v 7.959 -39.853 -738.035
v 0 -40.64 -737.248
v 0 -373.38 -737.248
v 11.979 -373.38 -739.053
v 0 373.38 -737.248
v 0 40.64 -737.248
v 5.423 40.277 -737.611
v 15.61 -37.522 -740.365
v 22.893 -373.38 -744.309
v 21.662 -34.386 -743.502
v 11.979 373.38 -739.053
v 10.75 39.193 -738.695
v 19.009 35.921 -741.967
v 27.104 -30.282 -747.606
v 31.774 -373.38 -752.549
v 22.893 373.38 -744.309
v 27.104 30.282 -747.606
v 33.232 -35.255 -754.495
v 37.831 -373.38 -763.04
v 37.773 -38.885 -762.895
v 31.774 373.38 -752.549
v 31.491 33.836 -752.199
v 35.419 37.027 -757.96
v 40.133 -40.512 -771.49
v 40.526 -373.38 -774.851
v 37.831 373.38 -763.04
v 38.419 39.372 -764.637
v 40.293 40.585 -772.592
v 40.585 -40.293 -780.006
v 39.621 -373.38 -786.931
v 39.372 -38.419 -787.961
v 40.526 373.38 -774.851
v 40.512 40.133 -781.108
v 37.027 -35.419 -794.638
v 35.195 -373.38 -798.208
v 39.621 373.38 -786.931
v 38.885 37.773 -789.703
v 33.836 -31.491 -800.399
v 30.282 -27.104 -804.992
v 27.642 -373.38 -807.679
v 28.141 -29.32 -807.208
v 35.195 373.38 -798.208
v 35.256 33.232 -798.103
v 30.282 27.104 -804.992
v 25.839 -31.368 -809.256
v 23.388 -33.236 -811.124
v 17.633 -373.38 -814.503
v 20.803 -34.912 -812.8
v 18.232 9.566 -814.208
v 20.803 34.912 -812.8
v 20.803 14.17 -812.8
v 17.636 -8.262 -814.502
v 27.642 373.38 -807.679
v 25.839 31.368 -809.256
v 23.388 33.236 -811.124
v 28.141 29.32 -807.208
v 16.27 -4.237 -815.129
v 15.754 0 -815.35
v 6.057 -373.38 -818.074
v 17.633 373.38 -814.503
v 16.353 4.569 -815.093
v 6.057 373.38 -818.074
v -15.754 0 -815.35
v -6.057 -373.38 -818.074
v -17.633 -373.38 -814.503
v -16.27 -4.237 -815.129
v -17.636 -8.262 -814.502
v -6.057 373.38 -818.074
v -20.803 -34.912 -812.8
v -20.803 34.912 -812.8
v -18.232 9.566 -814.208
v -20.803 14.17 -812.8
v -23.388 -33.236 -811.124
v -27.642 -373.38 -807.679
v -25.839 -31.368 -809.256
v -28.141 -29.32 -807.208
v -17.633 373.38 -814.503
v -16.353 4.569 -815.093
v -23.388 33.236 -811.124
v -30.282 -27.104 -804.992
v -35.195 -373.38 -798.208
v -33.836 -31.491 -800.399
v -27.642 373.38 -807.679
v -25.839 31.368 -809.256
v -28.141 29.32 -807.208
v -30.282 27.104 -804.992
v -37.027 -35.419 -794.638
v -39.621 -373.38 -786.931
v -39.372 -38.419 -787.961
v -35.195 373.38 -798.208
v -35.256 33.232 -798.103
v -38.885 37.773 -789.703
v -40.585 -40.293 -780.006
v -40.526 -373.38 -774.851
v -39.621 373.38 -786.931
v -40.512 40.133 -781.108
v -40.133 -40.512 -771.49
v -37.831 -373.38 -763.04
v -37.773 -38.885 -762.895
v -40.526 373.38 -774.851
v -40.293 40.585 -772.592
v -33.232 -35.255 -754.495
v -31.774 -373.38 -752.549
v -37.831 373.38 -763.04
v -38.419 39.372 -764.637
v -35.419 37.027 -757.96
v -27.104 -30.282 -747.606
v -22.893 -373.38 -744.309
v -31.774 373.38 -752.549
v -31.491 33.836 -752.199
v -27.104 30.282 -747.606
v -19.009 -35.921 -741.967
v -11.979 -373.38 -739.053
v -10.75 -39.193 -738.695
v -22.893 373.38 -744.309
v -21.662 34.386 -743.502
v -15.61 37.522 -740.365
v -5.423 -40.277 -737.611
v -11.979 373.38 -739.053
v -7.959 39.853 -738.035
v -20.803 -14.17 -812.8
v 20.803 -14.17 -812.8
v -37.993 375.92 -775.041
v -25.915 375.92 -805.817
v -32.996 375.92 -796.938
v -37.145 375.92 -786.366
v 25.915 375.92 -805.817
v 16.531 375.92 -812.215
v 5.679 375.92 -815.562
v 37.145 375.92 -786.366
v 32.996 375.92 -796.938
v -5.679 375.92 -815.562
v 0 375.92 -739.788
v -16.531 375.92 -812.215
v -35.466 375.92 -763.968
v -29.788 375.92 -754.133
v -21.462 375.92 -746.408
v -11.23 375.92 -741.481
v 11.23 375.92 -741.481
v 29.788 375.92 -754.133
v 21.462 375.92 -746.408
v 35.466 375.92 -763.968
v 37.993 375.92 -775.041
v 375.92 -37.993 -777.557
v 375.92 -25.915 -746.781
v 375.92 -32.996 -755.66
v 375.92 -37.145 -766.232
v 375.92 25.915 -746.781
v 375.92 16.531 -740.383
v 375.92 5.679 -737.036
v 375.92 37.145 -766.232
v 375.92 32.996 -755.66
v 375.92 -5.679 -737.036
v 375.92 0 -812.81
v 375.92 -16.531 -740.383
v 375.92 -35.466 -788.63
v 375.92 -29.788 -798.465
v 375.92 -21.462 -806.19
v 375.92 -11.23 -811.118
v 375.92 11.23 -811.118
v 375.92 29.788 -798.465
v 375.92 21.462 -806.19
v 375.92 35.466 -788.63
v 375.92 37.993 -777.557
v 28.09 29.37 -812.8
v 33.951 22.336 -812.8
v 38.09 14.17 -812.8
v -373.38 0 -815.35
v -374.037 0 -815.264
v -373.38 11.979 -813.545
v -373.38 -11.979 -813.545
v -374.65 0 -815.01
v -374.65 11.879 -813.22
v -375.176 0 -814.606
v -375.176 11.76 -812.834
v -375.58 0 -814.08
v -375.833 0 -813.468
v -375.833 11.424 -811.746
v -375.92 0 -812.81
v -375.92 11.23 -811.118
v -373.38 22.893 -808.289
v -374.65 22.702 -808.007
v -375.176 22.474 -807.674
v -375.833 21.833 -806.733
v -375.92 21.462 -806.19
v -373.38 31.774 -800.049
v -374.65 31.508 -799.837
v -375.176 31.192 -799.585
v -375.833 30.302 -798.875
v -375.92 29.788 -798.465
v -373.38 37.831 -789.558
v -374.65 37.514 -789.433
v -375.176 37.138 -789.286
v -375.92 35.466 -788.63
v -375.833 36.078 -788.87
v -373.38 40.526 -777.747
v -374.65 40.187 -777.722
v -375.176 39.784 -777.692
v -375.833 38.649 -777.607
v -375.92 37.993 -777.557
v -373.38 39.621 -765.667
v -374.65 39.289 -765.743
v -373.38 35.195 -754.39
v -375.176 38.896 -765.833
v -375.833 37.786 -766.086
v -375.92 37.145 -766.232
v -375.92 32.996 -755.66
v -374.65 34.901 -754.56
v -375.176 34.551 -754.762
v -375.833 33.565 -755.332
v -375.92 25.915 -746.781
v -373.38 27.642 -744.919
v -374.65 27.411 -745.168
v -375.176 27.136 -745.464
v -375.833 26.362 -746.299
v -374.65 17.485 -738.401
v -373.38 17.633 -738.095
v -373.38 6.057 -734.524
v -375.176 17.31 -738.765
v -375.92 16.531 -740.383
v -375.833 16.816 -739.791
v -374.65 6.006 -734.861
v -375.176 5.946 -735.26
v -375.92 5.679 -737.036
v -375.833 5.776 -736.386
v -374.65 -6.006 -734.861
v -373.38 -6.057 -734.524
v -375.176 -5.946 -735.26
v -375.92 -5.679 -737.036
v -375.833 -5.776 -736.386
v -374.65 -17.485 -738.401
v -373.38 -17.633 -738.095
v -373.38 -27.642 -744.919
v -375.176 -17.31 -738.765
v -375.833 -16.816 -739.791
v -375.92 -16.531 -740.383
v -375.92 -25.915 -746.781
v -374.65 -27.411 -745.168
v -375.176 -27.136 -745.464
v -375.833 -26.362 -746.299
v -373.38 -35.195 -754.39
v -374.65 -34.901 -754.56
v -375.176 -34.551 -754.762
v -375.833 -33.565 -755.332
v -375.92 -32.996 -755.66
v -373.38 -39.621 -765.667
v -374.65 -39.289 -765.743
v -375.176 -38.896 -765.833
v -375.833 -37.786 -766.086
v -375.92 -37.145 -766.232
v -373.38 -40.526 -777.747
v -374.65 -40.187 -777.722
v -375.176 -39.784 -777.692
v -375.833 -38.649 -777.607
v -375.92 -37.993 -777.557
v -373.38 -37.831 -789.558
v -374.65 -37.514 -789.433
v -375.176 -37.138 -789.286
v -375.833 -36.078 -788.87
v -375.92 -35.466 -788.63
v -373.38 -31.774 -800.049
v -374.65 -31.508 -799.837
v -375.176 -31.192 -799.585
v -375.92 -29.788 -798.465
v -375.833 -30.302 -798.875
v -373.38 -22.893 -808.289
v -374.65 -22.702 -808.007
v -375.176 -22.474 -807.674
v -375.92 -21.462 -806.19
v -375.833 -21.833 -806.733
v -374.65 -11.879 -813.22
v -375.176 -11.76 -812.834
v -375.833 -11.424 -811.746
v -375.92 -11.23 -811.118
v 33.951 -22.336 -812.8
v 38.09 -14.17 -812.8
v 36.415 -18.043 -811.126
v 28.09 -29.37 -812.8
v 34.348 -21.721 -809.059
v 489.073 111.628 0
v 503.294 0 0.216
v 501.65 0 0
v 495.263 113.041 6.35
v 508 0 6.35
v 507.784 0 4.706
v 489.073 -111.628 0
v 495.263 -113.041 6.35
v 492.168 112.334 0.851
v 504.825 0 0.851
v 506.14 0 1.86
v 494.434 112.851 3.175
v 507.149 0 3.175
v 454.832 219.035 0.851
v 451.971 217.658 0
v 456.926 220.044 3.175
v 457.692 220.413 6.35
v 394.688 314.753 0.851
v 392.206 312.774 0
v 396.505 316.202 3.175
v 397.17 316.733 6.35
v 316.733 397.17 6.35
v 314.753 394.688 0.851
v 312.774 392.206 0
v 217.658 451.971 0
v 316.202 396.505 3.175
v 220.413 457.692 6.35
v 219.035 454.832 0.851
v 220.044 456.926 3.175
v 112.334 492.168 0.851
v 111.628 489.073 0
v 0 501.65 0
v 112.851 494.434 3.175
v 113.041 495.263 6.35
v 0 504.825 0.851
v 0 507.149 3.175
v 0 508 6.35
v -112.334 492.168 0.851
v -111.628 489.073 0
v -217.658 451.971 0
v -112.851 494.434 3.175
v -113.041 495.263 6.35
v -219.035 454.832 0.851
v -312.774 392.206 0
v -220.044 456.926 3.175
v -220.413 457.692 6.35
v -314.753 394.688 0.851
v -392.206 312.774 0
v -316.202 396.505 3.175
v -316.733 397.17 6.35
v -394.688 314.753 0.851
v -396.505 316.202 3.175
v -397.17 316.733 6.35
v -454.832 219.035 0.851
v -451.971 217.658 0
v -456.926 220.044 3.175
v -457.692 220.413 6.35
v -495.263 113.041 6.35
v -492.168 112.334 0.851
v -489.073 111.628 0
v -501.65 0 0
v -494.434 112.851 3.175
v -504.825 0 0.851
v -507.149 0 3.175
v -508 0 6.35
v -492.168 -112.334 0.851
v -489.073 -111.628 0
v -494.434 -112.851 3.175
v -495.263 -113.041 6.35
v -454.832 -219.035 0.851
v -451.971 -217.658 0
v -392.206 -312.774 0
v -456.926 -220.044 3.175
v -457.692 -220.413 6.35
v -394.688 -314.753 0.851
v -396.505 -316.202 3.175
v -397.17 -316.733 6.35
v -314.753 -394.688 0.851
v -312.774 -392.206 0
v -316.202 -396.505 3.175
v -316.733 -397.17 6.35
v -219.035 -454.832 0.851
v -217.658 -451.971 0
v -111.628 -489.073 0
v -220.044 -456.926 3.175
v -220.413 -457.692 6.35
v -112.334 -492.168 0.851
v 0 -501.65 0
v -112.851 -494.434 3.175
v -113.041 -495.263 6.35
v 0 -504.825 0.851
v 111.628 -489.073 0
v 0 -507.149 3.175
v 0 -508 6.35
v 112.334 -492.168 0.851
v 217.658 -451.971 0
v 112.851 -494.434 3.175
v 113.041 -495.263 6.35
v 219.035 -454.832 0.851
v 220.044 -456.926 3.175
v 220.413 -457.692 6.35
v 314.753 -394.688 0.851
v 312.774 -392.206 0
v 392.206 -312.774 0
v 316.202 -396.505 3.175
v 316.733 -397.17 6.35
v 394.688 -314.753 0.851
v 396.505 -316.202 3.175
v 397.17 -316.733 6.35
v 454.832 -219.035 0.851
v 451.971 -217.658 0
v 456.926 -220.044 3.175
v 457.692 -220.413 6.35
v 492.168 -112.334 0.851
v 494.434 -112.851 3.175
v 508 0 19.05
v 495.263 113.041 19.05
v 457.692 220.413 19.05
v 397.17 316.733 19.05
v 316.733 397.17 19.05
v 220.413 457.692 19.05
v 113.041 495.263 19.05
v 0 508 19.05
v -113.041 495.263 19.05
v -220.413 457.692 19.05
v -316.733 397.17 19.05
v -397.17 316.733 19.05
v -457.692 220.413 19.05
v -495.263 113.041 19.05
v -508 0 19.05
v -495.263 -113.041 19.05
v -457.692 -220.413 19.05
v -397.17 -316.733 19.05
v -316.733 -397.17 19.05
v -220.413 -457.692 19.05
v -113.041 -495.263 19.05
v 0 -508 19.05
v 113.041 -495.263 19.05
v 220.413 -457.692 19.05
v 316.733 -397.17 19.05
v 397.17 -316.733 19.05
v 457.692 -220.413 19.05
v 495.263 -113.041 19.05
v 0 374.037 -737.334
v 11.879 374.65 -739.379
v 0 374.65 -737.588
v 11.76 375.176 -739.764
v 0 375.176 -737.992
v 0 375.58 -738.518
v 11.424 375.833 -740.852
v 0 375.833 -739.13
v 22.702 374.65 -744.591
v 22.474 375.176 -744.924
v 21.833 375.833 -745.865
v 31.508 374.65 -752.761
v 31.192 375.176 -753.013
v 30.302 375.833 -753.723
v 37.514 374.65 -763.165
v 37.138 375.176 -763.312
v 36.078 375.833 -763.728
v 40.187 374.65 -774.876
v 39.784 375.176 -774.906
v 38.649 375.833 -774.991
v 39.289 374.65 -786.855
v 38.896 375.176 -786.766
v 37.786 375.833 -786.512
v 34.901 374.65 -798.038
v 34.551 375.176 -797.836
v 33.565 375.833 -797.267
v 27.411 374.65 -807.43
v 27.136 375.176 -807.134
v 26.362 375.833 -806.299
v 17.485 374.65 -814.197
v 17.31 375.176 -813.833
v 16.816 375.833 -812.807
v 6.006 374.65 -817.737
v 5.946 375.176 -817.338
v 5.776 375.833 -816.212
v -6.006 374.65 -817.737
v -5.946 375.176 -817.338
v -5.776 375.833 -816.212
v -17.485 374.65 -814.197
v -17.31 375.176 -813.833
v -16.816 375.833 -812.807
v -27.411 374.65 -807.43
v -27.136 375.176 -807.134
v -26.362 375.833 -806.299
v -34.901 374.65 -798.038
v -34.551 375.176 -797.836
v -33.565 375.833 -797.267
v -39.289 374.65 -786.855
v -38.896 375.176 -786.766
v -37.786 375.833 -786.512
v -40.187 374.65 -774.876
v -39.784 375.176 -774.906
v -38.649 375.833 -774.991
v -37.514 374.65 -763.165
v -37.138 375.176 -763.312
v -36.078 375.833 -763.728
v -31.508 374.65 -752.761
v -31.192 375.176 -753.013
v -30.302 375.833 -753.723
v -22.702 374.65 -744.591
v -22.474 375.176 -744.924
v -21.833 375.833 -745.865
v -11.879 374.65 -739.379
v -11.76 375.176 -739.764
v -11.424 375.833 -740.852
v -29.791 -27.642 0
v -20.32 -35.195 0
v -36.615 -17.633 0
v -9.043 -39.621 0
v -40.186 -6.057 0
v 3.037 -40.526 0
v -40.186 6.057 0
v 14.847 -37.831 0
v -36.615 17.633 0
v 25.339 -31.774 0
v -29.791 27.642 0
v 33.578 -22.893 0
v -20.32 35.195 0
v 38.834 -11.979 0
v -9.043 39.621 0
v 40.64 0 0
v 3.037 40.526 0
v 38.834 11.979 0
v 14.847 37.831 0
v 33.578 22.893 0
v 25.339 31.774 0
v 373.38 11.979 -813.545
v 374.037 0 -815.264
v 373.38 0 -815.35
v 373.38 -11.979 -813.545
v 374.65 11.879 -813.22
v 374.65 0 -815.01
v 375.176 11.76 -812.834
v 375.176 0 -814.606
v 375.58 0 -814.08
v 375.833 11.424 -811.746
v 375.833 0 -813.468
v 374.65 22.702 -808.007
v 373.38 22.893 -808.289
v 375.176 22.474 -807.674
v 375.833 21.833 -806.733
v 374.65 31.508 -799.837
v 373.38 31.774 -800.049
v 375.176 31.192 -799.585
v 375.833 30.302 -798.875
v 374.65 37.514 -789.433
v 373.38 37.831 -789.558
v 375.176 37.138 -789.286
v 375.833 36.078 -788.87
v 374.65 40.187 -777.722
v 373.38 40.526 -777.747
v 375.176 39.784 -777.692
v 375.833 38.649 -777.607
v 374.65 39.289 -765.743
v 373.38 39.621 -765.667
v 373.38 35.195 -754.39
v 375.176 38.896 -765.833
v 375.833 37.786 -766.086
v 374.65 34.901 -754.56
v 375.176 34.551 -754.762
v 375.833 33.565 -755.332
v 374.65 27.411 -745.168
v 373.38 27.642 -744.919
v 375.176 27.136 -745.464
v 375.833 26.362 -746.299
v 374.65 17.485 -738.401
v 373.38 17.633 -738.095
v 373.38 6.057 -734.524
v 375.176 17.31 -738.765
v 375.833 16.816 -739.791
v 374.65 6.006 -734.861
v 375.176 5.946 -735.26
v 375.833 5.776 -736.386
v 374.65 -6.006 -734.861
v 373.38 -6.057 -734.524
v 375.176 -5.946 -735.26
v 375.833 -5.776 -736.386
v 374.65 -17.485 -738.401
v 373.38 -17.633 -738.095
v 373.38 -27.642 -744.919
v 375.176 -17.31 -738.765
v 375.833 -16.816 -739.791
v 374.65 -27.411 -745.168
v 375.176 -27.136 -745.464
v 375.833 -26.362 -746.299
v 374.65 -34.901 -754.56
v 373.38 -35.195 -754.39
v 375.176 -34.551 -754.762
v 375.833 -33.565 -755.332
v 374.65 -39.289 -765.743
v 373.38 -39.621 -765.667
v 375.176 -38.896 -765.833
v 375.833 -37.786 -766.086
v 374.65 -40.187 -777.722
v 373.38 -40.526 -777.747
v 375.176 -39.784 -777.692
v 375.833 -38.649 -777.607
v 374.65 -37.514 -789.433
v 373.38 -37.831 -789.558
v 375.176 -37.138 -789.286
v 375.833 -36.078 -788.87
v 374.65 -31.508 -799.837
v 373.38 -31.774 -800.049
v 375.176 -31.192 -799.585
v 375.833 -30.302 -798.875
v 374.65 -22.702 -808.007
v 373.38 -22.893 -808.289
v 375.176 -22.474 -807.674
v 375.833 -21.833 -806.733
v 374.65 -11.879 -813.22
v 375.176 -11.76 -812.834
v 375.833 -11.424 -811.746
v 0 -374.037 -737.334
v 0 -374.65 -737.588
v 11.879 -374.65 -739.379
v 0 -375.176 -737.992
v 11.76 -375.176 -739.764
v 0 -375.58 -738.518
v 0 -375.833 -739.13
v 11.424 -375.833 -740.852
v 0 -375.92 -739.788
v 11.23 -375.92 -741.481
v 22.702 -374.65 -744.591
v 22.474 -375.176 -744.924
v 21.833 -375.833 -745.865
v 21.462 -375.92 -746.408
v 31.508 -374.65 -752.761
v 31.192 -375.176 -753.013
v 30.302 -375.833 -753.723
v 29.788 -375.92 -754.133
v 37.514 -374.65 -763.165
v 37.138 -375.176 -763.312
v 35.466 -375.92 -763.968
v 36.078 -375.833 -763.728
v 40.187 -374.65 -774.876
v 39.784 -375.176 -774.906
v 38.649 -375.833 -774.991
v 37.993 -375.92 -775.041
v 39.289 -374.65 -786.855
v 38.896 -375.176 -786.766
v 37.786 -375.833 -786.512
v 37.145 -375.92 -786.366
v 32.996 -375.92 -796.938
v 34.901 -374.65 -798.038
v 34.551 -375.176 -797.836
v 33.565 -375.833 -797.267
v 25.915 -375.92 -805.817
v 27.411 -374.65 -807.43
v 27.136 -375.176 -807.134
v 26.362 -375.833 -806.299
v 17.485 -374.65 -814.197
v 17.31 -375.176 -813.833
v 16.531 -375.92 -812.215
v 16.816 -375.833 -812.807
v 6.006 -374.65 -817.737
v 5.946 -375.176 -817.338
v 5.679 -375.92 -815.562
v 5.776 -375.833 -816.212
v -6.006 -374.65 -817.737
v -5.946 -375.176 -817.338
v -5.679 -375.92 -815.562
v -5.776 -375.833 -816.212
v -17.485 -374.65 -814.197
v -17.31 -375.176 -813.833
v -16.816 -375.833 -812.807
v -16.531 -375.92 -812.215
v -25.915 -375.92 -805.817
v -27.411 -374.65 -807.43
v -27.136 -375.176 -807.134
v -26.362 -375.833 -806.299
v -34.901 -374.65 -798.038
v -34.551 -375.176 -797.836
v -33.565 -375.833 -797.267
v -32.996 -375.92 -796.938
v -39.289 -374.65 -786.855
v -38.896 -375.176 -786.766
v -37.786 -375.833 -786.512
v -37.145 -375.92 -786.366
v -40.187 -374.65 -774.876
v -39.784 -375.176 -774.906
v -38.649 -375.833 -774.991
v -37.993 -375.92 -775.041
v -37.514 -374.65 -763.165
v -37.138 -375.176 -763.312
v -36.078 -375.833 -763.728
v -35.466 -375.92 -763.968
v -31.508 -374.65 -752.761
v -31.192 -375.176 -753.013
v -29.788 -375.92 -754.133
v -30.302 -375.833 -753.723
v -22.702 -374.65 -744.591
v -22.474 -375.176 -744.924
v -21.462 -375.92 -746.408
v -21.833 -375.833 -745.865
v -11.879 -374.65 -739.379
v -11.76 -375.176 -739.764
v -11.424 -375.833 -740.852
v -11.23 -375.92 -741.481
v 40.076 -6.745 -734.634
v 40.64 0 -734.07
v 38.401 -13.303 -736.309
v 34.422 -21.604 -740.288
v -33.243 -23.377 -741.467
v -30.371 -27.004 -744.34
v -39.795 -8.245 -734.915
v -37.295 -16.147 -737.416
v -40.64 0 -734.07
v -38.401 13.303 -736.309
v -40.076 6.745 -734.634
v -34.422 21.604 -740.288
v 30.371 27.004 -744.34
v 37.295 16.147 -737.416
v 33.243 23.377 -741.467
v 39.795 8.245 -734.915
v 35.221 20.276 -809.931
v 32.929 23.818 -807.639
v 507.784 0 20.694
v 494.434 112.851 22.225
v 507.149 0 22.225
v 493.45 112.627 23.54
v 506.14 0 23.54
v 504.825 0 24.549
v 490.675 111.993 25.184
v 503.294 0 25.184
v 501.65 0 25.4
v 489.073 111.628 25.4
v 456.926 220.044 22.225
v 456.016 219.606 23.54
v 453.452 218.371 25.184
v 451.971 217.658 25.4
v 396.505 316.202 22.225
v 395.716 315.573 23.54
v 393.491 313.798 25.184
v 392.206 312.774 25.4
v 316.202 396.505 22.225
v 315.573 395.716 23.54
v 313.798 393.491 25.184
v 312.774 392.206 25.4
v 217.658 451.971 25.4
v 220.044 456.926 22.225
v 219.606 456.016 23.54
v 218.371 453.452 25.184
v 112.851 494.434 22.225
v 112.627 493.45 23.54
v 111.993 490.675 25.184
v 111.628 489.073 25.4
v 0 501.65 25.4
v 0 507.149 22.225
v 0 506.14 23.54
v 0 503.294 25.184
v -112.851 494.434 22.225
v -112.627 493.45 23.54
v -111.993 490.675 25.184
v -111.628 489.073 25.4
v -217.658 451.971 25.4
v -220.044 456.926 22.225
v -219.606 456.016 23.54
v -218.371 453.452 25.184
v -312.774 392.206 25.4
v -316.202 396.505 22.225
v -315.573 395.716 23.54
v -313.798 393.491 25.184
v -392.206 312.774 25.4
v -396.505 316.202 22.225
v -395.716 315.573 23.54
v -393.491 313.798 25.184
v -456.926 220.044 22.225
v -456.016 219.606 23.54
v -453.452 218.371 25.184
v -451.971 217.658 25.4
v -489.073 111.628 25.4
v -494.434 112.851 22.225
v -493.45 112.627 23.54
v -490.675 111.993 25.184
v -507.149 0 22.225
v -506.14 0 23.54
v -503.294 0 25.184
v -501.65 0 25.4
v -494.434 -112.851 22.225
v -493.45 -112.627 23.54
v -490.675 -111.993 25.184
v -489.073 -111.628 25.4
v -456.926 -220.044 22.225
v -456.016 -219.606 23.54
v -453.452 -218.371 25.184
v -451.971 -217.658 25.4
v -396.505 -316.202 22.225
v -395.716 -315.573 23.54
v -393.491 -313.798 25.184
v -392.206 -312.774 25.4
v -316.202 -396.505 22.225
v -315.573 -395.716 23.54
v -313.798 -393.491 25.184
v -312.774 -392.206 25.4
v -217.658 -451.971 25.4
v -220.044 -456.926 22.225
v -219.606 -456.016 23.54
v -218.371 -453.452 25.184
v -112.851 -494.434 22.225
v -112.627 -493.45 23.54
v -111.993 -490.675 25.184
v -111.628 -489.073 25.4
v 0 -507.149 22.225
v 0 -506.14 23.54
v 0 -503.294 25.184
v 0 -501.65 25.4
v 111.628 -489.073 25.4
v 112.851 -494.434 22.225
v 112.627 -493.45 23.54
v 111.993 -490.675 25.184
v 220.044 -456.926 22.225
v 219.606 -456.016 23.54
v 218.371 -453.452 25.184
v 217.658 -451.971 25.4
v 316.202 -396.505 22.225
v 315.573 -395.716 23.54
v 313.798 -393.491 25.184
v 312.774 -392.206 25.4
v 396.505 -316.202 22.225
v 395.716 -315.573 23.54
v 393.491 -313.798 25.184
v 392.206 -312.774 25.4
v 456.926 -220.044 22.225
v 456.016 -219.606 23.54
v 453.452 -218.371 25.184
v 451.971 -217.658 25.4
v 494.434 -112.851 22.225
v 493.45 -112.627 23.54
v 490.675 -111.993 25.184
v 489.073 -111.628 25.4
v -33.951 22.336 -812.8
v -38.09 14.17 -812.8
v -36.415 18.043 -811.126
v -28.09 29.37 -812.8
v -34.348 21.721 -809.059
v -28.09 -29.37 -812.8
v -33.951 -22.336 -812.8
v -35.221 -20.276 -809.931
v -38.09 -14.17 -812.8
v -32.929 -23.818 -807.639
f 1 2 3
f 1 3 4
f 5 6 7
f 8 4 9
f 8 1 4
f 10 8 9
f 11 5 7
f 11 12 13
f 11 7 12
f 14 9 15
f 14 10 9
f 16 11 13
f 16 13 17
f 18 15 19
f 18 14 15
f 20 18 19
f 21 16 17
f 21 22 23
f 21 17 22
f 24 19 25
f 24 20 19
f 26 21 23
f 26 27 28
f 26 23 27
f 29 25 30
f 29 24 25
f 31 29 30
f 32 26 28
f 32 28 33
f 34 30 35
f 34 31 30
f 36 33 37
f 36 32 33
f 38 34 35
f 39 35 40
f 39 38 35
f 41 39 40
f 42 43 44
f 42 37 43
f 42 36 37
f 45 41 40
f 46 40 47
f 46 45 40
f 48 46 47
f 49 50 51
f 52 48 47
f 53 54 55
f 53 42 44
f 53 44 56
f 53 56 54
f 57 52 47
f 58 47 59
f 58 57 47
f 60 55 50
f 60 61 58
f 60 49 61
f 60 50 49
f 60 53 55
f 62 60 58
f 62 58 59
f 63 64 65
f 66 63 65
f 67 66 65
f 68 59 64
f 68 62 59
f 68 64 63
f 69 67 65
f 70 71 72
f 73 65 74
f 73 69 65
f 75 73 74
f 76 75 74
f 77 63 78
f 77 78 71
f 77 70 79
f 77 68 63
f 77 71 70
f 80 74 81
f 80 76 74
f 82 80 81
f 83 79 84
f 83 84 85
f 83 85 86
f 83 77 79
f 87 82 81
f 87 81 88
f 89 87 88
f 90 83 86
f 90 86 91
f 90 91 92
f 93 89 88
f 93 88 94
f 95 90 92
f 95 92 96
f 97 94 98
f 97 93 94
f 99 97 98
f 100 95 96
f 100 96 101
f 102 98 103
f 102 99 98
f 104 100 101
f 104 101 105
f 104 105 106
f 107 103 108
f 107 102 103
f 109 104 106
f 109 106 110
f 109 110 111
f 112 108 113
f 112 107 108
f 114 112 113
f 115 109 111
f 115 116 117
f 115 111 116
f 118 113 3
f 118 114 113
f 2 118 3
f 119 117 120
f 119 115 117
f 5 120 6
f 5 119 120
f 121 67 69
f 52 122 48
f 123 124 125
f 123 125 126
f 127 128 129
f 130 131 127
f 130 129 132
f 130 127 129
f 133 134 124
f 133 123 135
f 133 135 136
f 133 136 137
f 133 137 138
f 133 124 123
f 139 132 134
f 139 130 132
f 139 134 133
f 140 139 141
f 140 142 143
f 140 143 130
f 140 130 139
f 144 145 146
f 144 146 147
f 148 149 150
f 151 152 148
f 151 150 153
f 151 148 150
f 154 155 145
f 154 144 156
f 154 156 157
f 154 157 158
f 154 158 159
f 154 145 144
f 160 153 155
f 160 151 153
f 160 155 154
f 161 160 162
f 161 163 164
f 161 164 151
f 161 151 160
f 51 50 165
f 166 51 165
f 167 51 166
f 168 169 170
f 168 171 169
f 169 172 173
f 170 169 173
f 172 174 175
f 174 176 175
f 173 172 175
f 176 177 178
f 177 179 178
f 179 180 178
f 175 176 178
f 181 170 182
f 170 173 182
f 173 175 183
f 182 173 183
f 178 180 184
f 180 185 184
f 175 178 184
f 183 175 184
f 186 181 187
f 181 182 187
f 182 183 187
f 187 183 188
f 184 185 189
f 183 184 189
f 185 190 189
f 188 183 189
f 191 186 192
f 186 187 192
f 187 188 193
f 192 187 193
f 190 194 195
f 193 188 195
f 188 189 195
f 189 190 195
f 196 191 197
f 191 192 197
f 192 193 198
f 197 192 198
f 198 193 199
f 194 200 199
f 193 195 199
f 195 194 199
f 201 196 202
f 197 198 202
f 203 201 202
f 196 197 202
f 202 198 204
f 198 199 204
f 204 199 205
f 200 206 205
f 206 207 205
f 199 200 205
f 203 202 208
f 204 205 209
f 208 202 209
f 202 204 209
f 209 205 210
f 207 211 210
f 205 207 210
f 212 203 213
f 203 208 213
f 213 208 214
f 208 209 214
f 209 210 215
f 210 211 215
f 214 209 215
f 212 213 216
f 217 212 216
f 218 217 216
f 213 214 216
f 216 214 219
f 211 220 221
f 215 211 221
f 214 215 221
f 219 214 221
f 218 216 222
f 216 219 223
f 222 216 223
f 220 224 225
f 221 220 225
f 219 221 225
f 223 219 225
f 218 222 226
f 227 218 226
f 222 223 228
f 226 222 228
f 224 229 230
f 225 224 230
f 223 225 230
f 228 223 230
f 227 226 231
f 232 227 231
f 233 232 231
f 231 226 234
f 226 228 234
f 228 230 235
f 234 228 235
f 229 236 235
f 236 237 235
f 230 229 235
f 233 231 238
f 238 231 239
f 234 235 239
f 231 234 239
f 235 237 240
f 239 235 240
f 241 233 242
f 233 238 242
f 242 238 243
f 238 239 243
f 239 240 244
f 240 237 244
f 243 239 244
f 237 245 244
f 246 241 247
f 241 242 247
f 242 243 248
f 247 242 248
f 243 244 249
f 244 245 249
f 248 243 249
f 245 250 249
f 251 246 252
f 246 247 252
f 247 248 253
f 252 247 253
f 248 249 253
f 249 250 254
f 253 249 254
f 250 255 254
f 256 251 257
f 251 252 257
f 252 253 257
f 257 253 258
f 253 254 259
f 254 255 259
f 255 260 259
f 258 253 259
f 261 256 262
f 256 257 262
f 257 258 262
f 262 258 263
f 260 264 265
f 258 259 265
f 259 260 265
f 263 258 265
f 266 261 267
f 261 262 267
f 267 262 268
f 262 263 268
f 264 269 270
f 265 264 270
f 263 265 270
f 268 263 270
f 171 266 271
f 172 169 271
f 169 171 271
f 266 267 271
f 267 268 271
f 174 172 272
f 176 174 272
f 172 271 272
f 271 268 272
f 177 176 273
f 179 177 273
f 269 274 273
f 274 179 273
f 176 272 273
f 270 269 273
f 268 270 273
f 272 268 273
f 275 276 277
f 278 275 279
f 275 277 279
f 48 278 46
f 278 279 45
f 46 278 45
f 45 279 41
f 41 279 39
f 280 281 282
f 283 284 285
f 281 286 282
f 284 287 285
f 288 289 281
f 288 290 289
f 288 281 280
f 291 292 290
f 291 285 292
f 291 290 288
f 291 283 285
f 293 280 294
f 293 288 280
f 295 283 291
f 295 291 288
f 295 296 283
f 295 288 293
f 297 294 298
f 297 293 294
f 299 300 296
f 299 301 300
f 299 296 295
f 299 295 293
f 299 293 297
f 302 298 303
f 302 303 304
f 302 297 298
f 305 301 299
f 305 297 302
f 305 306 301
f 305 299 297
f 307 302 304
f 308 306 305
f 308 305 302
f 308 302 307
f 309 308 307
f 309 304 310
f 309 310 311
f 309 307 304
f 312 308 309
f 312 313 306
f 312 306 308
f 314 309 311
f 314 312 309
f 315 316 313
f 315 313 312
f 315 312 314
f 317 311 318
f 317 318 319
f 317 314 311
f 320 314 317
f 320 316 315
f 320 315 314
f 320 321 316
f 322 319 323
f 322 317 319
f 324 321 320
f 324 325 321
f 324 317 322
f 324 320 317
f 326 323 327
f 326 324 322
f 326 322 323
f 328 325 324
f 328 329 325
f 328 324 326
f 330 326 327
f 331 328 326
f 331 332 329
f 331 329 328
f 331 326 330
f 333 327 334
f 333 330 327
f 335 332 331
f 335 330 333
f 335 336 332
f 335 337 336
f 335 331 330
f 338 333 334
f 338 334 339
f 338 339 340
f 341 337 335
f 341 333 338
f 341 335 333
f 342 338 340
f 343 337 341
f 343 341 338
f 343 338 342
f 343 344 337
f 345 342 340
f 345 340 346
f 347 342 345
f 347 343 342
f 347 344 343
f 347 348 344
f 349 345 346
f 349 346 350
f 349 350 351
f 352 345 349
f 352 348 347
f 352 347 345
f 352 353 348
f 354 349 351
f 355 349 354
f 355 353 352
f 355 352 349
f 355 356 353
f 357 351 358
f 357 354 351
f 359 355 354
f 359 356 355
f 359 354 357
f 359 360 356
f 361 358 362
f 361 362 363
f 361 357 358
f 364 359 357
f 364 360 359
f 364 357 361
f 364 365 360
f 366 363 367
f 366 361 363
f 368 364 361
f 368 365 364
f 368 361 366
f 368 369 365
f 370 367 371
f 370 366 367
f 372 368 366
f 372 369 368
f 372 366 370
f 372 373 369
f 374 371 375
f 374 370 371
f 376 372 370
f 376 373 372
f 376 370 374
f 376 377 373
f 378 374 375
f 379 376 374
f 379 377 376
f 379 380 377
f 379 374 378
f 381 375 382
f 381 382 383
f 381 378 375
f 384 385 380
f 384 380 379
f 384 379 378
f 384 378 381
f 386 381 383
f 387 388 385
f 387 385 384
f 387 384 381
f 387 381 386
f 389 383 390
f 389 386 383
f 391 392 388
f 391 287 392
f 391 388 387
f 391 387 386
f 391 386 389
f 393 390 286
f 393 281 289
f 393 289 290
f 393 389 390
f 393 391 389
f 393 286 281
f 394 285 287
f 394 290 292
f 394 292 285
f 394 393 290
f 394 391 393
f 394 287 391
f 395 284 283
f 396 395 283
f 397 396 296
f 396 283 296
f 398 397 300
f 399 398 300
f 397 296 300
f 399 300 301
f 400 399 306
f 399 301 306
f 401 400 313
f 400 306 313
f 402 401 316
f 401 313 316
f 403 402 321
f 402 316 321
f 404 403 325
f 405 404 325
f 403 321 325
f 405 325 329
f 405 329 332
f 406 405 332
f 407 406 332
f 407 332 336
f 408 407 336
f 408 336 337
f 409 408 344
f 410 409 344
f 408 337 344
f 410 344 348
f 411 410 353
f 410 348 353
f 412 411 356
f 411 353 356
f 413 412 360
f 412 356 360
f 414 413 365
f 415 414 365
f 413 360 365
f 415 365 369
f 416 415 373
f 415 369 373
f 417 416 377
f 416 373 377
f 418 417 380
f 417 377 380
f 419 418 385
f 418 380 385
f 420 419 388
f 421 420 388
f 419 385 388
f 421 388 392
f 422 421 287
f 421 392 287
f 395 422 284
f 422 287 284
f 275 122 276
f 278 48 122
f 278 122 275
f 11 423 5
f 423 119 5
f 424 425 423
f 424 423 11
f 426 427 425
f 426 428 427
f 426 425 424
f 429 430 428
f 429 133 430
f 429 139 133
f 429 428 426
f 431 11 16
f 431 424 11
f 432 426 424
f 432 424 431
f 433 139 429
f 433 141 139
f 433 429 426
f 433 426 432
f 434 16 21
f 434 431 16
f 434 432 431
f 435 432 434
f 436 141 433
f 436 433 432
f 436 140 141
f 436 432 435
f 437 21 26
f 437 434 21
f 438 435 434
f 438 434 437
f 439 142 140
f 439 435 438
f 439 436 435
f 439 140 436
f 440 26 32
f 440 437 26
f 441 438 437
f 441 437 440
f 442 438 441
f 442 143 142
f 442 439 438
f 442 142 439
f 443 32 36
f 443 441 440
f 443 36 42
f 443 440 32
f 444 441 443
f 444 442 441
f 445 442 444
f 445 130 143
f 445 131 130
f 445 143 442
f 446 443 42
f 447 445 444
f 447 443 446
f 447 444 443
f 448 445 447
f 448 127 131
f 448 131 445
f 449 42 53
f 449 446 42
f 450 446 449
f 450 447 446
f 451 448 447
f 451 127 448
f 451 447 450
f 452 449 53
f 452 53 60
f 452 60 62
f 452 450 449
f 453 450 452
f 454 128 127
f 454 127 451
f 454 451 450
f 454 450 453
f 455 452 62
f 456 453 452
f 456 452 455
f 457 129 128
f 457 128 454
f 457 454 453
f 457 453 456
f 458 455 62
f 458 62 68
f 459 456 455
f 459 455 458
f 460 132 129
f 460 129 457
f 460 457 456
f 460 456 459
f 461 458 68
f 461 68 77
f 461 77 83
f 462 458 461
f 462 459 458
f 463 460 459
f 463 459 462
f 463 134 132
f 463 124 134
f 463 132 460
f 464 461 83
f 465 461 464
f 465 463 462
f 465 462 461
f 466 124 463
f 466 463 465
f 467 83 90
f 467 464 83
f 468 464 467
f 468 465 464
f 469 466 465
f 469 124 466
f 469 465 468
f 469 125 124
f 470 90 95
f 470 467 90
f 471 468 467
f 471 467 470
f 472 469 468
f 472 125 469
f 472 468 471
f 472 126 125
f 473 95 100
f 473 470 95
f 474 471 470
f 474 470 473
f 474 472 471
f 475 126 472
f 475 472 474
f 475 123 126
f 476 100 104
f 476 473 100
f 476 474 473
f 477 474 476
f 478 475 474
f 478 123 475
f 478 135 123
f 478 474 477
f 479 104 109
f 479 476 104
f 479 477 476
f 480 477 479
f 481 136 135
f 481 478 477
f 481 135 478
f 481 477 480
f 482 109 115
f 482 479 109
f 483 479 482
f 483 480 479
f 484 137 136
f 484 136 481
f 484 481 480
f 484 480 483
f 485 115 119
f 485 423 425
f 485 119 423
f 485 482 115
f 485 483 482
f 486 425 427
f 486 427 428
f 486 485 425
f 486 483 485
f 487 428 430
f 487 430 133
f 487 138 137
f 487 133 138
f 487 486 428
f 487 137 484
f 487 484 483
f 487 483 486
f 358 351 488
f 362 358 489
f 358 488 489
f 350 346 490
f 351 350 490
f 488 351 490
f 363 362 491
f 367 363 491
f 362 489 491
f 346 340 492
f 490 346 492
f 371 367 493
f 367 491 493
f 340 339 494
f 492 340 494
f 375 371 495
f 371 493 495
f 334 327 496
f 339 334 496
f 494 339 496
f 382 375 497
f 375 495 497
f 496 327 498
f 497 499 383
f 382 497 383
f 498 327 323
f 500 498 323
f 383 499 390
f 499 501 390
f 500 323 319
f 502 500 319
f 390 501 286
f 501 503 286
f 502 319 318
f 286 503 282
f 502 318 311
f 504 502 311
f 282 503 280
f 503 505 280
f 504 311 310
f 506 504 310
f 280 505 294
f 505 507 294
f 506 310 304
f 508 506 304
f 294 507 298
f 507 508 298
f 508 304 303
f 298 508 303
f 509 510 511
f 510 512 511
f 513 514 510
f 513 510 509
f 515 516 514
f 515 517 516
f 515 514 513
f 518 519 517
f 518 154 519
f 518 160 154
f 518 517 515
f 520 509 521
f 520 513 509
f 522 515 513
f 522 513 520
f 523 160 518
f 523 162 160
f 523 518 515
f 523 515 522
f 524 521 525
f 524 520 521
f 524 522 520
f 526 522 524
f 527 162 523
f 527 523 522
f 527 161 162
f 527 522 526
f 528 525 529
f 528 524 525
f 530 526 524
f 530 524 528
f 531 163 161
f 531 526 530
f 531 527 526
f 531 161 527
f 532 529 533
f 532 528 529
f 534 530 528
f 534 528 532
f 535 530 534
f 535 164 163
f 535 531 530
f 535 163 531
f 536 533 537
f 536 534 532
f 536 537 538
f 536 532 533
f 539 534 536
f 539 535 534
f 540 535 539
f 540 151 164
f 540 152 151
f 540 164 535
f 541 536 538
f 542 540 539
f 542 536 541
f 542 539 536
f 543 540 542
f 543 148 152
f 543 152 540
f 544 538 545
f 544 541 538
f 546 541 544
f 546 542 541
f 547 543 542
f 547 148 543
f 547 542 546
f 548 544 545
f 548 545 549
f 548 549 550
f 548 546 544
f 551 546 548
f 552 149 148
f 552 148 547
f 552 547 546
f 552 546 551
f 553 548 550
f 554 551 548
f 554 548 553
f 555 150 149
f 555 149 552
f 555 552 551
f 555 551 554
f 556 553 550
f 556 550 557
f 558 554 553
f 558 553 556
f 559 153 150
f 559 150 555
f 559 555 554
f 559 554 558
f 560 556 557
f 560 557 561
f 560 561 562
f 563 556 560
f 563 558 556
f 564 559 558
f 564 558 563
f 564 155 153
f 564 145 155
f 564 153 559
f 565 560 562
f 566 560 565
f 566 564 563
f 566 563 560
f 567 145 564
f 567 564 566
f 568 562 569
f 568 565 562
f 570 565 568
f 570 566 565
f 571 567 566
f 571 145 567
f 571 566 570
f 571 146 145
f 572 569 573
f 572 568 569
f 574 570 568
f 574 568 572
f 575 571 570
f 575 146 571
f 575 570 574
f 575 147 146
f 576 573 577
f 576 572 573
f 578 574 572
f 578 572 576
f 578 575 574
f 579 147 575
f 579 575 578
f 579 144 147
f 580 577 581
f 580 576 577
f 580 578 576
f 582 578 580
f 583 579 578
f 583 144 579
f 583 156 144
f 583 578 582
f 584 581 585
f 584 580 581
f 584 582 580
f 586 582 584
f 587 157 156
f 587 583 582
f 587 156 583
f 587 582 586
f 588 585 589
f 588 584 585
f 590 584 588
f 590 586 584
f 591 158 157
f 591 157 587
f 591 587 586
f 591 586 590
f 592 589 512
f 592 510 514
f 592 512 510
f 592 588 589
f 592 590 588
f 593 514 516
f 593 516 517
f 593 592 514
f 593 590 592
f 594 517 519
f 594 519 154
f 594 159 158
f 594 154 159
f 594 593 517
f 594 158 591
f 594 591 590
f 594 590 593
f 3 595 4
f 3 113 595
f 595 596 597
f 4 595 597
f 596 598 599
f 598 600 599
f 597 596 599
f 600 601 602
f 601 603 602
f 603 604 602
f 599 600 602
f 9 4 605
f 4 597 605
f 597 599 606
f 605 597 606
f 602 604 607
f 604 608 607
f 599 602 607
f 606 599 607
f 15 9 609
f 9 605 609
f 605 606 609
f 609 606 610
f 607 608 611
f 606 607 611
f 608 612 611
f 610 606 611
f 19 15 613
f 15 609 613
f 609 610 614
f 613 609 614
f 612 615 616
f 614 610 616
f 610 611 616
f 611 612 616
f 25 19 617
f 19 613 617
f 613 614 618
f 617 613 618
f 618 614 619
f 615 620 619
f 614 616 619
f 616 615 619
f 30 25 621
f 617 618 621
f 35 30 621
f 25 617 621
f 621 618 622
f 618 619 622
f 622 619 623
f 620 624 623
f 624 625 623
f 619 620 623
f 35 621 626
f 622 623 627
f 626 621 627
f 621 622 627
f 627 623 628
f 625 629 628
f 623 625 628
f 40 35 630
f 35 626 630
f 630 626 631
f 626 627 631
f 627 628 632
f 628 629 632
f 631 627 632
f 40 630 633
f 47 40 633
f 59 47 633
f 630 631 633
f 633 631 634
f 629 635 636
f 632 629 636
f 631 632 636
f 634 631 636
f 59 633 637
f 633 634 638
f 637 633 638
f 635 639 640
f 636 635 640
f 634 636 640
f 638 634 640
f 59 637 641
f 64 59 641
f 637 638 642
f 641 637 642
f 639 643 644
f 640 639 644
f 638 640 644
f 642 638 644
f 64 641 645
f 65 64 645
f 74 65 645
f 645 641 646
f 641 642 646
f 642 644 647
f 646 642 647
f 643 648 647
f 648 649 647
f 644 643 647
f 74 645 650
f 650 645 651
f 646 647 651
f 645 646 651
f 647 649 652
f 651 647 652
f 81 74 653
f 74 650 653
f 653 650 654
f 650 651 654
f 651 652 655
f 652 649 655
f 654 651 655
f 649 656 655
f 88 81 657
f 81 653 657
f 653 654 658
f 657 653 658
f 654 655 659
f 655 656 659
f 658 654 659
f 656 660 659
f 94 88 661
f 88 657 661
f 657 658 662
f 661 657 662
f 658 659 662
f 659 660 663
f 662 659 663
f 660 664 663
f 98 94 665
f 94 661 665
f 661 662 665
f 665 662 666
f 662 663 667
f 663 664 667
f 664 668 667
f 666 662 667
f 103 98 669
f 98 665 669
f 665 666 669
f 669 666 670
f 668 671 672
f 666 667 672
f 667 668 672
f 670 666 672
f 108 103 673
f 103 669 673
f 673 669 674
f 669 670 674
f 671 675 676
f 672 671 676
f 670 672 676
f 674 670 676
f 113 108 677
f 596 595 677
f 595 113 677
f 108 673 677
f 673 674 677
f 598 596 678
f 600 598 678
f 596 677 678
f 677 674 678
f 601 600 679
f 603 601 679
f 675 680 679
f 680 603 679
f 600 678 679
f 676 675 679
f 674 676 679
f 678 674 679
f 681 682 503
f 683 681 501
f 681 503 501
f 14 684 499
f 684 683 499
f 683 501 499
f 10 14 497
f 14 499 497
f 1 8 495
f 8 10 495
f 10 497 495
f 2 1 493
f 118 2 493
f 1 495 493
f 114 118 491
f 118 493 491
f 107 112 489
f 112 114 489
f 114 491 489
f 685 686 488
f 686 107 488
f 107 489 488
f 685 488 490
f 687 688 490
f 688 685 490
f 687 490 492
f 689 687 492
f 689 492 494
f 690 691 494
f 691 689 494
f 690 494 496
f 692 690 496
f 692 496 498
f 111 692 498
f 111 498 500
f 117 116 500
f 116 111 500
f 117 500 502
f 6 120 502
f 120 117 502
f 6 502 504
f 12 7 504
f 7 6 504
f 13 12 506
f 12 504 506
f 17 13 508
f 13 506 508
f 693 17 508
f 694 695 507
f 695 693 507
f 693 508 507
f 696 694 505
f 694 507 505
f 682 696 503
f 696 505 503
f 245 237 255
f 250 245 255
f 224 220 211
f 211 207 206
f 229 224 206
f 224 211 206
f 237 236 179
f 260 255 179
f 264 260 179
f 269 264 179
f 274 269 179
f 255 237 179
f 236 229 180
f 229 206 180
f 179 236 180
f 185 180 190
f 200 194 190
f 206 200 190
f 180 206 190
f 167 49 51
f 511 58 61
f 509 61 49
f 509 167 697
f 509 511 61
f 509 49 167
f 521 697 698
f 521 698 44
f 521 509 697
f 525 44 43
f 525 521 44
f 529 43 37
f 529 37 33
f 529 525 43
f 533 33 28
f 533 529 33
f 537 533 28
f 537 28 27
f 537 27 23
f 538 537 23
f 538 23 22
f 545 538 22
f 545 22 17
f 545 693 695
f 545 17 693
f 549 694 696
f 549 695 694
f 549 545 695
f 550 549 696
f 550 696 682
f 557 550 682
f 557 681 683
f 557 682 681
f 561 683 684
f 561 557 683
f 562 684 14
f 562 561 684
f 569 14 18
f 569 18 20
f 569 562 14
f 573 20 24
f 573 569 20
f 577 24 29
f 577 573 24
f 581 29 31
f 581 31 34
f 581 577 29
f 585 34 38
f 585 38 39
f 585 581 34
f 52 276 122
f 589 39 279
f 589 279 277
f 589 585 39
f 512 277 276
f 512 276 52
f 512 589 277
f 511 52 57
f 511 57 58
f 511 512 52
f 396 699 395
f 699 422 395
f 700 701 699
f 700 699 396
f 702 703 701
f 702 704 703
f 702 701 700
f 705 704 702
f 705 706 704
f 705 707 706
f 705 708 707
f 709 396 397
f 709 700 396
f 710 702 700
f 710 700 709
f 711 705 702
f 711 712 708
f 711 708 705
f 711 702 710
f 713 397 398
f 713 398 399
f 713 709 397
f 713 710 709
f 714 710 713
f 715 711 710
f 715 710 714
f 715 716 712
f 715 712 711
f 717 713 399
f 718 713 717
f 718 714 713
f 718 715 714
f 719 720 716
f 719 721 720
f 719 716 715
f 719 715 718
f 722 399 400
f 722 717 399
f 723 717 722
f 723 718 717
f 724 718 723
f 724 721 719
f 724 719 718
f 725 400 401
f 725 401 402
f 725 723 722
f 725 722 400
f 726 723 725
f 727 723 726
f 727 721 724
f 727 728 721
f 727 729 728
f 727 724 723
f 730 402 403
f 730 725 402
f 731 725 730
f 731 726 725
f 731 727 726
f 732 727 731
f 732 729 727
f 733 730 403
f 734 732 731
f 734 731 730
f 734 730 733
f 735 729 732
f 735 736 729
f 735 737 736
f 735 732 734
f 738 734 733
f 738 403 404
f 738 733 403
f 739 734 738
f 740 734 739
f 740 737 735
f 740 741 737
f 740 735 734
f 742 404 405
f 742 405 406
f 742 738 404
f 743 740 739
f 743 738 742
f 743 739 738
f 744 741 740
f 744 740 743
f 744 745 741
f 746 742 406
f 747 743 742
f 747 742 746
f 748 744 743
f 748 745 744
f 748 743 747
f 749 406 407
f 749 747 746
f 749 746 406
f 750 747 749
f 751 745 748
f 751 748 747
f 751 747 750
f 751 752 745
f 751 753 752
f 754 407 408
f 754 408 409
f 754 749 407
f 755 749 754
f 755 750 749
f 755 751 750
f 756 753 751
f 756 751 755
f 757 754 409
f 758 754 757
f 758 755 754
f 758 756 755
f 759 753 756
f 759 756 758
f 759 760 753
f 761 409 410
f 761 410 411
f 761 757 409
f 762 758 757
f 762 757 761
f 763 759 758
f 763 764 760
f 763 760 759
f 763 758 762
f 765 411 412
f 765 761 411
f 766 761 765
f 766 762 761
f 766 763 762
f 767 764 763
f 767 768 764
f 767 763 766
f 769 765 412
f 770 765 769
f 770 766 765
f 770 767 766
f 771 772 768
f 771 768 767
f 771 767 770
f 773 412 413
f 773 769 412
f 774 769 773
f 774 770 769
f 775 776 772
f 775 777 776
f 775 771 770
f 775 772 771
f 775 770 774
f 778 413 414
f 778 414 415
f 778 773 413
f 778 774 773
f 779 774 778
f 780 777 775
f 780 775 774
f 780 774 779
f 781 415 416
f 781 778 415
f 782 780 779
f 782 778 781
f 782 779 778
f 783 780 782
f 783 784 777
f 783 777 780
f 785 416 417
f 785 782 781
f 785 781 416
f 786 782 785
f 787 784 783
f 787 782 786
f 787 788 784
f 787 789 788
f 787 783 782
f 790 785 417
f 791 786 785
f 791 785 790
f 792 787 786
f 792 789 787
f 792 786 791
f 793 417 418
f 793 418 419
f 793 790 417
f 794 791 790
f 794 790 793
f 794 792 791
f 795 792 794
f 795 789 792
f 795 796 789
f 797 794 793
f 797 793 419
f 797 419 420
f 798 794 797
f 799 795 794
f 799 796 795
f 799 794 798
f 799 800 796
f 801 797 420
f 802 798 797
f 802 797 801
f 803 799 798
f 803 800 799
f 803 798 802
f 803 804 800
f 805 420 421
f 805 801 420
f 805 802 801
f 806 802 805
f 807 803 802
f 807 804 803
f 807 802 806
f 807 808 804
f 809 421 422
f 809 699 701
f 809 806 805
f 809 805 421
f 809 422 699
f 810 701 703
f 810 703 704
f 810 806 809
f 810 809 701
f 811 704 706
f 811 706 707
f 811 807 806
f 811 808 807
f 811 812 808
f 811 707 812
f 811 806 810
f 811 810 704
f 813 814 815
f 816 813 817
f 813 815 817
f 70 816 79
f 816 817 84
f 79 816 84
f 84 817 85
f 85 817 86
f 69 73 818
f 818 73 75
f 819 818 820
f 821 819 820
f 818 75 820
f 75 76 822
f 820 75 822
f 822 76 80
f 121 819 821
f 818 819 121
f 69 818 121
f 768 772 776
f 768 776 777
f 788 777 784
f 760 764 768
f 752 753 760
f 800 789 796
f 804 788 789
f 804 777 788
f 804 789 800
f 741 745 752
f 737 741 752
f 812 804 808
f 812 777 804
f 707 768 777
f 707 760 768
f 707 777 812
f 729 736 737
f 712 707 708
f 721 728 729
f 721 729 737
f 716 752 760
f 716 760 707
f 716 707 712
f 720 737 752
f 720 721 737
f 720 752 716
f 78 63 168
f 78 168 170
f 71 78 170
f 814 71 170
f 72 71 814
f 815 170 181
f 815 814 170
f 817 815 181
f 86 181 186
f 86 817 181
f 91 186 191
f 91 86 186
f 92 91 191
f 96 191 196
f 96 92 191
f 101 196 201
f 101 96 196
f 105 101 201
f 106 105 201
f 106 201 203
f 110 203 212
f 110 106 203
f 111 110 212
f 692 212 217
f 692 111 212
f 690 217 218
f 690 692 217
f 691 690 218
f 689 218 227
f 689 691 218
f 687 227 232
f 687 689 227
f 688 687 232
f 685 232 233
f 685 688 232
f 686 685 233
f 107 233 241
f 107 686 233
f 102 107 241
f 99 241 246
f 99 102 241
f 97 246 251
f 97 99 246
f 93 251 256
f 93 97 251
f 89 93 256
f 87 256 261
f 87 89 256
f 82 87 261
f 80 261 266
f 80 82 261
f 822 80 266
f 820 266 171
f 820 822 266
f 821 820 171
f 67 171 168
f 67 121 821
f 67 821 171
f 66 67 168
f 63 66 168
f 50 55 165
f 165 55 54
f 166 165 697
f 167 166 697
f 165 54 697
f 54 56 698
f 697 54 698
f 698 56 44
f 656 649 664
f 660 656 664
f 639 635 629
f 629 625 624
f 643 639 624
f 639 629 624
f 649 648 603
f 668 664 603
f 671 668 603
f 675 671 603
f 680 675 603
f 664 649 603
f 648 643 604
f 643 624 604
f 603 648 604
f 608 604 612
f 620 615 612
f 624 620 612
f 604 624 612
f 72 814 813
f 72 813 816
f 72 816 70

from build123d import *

# Parameters (mm, degrees)
SKETCH1_R           = 508
BASE_EXTRUDE_DEPTH  = 25.4
SKETCH5_R           = 40.64
BOSS_EXTRUDE1_DEPTH = 812.8
SKETCH6_R           = 40.64
BOSS_EXTRUDE2_DEPTH = 375.92
SKETCH7_R           = 40.64
BOSS_EXTRUDE3_DEPTH = 375.92
FILLET2_R           = 6.35
FILLET3_R           = 2.54


with BuildPart() as part:
    # Sketch1 → Base-Extrude (new body)
    with BuildSketch(Plane.XY):
        Circle(SKETCH1_R)
    extrude(amount=BASE_EXTRUDE_DEPTH)

    # Sketch5 → Boss-Extrude1 (add)
    with BuildSketch(Plane(origin=(0, 0, 0), x_dir=(-1, 0, 0), z_dir=(0, 0, -1))):
        with Locations(Location((0, 0, 0), (0, 0, 180))):
            Circle(SKETCH5_R)
    extrude(amount=BOSS_EXTRUDE1_DEPTH)

    # Sketch6 → Boss-Extrude2 (add, symmetric)
    with BuildSketch(Plane(origin=(0, 0, 0), x_dir=(0, 0, -1), z_dir=(1, 0, 0))):
        with Locations((774.71024772, 0)):
            Circle(SKETCH6_R)
    extrude(amount=BOSS_EXTRUDE2_DEPTH, both=True)

    # Sketch7 → Boss-Extrude3 (add, symmetric)
    with BuildSketch(Plane(origin=(0, 0, 0), x_dir=(1, 0, 0), z_dir=(0, 1, 0))):
        with Locations(Location((0, 777.887828837, 0), (0, 0, 270))):
            Circle(SKETCH7_R)
    extrude(amount=BOSS_EXTRUDE3_DEPTH, both=True)

    # Fillet2
    fillet2_edges = [part.edges().sort_by_distance(p)[0] for p in [
        (-508, 0, 0),
        (-508, 0, 25.4),
    ]]
    fillet(fillet2_edges, radius=FILLET2_R)

    # Fillet3
    fillet3_edges = [part.edges().sort_by_distance(p)[0] for p in [
        (-375.92, 0, -734.07024772),
        (375.92, 0, -734.07024772),
        (0, -375.92, -818.527828837),
        (0, 375.92, -818.527828837),
    ]]
    fillet(fillet3_edges, radius=FILLET3_R)


solid = part.part
